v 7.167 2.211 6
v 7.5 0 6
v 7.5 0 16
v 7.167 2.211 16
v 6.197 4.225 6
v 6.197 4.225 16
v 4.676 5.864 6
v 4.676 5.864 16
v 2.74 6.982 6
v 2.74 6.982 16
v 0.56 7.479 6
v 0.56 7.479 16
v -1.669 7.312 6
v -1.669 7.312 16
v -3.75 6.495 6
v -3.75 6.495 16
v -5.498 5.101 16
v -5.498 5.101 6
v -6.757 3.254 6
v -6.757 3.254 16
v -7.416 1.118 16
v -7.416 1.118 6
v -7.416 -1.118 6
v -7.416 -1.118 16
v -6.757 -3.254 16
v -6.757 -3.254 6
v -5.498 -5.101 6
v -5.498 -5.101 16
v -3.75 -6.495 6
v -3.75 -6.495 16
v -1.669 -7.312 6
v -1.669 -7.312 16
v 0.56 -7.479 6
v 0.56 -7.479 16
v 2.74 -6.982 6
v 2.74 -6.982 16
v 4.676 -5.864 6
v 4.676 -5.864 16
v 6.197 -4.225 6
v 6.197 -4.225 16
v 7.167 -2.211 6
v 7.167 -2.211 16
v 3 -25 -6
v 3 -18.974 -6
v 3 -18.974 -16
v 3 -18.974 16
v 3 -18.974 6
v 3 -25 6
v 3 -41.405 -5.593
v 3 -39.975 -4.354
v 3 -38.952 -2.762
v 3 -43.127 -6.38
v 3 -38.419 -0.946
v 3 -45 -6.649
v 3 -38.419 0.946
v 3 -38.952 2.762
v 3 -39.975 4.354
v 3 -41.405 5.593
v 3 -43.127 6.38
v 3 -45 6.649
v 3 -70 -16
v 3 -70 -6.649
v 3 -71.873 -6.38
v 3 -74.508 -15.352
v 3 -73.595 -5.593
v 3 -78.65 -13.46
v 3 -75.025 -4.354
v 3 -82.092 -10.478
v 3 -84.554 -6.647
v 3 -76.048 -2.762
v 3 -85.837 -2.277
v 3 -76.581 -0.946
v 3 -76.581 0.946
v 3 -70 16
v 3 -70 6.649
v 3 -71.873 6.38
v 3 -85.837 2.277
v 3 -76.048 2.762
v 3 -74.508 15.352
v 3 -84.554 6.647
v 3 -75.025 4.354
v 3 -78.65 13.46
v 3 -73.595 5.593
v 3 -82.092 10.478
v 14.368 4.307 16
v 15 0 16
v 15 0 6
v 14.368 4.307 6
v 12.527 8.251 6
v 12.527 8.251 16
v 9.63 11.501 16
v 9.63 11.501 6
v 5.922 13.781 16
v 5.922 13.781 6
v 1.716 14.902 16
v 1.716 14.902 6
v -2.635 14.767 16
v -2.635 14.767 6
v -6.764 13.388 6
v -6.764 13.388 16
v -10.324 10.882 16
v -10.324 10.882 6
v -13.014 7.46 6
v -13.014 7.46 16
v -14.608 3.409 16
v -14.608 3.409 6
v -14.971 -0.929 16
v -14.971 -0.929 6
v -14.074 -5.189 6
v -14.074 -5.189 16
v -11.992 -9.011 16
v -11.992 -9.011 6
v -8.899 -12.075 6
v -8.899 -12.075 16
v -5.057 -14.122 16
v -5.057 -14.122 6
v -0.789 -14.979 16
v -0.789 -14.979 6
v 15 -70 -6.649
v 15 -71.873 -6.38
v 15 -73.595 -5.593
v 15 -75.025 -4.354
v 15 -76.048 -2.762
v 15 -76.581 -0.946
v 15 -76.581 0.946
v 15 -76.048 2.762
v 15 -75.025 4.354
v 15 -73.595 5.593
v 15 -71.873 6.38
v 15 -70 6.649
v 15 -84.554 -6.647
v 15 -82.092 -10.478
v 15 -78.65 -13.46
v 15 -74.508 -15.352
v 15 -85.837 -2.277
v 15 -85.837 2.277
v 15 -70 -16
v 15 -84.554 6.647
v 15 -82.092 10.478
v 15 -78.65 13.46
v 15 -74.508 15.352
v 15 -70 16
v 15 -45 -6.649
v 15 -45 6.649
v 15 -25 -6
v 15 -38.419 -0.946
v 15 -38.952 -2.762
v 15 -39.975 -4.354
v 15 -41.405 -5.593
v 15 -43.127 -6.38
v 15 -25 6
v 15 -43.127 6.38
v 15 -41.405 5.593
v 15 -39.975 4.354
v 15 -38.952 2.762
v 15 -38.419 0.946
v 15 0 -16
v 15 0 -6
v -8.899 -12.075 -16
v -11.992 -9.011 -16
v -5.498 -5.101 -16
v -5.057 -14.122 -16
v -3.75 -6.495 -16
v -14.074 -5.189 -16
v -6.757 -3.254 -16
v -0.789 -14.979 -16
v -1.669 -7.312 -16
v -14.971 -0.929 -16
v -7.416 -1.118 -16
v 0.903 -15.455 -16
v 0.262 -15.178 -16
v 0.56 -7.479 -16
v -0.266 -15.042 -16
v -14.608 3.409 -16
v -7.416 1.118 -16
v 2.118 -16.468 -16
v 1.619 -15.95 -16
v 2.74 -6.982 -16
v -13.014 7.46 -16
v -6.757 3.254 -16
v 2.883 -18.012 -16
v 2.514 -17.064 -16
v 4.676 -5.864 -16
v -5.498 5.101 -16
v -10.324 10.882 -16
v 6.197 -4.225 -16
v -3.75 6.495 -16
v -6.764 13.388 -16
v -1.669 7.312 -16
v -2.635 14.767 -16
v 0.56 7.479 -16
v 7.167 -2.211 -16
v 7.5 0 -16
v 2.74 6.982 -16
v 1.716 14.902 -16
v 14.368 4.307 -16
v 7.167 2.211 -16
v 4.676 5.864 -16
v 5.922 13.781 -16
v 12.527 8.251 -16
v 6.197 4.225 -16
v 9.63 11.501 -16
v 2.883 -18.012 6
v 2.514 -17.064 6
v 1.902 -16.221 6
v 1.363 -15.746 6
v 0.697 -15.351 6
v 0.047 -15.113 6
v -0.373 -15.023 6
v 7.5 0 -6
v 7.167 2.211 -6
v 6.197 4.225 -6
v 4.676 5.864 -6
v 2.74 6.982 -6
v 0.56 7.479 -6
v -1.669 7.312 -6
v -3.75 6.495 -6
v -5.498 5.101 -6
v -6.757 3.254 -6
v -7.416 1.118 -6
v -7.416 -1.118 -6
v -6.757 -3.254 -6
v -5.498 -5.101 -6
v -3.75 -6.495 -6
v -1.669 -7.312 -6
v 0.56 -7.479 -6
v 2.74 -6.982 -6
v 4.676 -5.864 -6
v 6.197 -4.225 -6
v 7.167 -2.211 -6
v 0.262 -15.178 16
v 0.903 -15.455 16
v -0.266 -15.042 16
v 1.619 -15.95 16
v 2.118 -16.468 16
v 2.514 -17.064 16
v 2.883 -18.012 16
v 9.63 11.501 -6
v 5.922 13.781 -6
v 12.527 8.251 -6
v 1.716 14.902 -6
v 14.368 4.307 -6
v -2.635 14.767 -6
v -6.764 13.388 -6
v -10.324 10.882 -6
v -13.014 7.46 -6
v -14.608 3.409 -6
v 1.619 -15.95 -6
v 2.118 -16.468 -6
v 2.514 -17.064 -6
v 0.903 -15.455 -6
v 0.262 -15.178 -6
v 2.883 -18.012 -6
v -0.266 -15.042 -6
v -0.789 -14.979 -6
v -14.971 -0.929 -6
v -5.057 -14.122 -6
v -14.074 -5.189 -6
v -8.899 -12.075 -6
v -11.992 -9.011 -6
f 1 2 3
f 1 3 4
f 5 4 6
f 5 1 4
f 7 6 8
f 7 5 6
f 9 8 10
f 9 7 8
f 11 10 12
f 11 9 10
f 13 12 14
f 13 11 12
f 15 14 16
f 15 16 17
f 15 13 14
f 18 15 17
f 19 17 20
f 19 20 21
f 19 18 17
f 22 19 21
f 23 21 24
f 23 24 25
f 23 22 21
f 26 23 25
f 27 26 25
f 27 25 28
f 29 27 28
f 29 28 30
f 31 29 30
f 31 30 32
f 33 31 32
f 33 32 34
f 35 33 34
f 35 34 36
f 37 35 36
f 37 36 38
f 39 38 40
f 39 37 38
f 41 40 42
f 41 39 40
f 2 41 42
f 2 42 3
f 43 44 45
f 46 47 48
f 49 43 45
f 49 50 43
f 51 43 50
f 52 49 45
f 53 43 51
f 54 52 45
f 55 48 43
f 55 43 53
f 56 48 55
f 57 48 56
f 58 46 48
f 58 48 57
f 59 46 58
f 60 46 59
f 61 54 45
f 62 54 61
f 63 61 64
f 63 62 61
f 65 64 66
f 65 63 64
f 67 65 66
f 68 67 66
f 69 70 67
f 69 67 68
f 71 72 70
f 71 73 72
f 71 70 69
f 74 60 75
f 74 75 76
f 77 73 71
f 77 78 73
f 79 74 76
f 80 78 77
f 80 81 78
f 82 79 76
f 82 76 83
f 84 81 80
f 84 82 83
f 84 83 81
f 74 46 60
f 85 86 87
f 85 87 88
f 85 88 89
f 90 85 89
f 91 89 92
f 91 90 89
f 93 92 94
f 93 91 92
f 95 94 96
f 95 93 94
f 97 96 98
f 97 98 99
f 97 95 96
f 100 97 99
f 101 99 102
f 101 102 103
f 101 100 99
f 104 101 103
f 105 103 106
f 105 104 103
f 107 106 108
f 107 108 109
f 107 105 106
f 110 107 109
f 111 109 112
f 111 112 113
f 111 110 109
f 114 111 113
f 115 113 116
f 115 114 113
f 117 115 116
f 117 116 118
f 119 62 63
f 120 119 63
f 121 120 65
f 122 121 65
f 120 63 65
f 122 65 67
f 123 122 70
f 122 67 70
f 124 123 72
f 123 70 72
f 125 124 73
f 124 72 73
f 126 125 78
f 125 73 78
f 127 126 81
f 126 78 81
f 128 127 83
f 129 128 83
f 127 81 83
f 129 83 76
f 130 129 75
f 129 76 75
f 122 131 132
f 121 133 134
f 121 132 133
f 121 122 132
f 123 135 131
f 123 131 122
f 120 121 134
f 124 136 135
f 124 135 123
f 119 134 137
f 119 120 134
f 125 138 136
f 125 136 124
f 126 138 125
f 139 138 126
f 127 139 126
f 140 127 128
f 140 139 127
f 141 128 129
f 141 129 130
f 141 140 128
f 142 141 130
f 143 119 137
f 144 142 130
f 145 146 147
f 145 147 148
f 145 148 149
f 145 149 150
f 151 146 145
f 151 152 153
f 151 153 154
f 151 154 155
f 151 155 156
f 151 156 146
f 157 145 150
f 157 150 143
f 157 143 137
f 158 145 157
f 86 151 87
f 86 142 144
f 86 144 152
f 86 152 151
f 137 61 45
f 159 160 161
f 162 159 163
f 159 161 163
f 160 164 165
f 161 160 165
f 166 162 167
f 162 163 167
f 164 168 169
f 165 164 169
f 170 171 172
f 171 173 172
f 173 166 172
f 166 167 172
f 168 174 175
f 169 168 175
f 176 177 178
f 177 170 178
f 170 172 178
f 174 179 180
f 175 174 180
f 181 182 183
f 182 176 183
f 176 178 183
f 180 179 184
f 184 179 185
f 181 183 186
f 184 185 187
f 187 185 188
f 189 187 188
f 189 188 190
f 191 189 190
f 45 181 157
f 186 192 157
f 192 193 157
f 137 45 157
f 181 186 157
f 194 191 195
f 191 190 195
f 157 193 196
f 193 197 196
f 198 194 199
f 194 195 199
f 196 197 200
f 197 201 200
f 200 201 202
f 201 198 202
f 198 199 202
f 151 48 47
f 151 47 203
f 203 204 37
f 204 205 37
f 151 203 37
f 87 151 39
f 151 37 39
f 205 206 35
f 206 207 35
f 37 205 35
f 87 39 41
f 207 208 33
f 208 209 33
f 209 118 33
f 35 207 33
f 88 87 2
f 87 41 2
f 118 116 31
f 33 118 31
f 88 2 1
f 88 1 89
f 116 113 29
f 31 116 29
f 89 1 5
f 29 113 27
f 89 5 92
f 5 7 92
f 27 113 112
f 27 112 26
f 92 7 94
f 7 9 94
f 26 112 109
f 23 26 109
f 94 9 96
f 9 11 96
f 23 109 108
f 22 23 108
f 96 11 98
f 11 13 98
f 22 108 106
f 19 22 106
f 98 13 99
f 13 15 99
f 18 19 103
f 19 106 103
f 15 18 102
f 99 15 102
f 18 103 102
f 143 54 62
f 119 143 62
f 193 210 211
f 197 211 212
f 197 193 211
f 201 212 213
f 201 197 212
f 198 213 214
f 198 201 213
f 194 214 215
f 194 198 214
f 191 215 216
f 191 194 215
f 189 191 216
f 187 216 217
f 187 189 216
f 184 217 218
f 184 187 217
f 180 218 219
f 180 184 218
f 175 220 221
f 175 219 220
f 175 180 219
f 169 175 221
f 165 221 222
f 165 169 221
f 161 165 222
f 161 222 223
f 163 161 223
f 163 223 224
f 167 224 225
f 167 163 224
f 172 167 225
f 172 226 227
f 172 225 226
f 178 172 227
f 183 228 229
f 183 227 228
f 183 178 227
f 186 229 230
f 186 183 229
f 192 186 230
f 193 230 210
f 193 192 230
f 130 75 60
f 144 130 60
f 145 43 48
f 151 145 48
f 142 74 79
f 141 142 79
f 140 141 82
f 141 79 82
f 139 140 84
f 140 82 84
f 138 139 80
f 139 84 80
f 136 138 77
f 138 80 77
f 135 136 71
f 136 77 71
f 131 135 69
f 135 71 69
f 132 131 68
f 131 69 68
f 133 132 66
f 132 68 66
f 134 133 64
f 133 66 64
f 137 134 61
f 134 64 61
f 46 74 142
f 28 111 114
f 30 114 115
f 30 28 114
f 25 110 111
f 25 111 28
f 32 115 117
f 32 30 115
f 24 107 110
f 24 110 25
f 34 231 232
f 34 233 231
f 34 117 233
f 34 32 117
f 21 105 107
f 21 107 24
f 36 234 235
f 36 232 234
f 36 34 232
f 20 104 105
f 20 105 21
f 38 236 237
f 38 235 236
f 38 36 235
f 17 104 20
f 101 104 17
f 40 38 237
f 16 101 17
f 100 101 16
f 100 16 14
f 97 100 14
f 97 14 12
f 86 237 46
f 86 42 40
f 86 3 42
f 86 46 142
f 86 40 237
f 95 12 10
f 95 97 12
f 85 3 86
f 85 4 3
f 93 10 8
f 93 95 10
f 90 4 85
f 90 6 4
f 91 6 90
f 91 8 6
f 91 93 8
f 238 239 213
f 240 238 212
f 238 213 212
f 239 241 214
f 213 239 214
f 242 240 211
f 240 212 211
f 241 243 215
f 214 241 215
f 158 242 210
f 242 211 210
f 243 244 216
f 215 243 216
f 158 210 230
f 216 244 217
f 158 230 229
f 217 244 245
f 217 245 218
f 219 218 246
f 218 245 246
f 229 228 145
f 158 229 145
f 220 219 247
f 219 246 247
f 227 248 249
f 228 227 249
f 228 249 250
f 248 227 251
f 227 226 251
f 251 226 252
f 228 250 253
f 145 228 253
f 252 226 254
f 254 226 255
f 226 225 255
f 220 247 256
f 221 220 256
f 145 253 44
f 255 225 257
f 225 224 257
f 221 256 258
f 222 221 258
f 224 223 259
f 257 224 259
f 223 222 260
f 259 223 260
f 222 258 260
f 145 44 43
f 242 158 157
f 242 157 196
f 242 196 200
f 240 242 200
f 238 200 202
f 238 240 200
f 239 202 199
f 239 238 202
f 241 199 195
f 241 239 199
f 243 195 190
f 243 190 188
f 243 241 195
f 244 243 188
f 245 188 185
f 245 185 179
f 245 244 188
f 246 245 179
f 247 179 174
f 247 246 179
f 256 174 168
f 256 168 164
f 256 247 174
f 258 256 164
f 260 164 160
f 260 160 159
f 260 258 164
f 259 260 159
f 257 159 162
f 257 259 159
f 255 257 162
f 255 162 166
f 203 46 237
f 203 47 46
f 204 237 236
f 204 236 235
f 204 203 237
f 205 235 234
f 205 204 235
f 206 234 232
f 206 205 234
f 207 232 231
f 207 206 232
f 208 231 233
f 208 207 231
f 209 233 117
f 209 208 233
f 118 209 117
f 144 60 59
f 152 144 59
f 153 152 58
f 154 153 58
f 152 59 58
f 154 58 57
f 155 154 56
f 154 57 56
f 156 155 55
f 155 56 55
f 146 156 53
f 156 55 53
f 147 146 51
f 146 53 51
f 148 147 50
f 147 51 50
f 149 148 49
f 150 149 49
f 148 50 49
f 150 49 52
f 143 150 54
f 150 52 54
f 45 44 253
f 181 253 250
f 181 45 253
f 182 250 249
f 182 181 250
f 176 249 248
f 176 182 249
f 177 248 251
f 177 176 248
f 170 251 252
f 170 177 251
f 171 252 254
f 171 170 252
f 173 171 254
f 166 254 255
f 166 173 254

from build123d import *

# Parameters (mm, degrees)
F0_R     = 7.5
F1_DEPTH = 16
F3_W     = 10.303062
F3_H     = 12
F4_DEPTH = 12.001
F5_W     = 37.142856
F5_H     = 12
F6_DEPTH = 40.001
F7_R     = 4


with BuildPart() as f1:
    # F0 (on Top) → F1 (new body, symmetric)
    with BuildSketch(Plane.XY):
        with BuildLine():
            Line((15, -86.085342), (15, 0))
            ThreePointArc((15, 0), (-10.606602, 10.606602), (0, -15))
            ThreePointArc((0, -15), (1.507634, -14.924042), (3, -14.696938))
            Line((3, -14.696938), (3, -86.085342))
            Line((3, -86.085342), (15, -86.085342))
        make_face()
        Circle(F0_R, mode=Mode.SUBTRACT)
    extrude(amount=F1_DEPTH, both=True)

    # F3 (on face) → F4 (cut, through all)
    with BuildSketch(Plane(origin=(3, 0, 0), x_dir=(0, -1, 0), z_dir=(-1, 0, 0))):
        with BuildLine():
            ThreePointArc((70, 16), (86, 0), (70, -16))
            Line((70, -16), (86.085342, -16))
            Line((86.085342, -16), (86.085342, 16))
            Line((86.085342, 16), (70, 16))
        make_face()
        with BuildLine():
            ThreePointArc((45, 6.648935), (38.351065, 0), (45, -6.648935))
            Line((45, -6.648935), (70, -6.648935))
            ThreePointArc((70, -6.648935), (76.648935, 0), (70, 6.648935))
            Line((70, 6.648935), (45, 6.648935))
        make_face()
        with Locations((19.848469, 0)):
            Rectangle(F3_W, F3_H)
    extrude(amount=-F4_DEPTH, mode=Mode.SUBTRACT)

    # F5 (on offset) → F6 (cut, through all)
    with BuildSketch(Plane.YZ.offset(-25)):
        Rectangle(F5_W, F5_H)
    extrude(amount=F6_DEPTH, mode=Mode.SUBTRACT)

    # F7
    f7_edges = [f1.edges().sort_by_distance(p)[0] for p in [
        (3, -14.696938, -11),
        (3, -14.696938, 11),
    ]]
    fillet(f7_edges, radius=F7_R)


solid = f1.part
